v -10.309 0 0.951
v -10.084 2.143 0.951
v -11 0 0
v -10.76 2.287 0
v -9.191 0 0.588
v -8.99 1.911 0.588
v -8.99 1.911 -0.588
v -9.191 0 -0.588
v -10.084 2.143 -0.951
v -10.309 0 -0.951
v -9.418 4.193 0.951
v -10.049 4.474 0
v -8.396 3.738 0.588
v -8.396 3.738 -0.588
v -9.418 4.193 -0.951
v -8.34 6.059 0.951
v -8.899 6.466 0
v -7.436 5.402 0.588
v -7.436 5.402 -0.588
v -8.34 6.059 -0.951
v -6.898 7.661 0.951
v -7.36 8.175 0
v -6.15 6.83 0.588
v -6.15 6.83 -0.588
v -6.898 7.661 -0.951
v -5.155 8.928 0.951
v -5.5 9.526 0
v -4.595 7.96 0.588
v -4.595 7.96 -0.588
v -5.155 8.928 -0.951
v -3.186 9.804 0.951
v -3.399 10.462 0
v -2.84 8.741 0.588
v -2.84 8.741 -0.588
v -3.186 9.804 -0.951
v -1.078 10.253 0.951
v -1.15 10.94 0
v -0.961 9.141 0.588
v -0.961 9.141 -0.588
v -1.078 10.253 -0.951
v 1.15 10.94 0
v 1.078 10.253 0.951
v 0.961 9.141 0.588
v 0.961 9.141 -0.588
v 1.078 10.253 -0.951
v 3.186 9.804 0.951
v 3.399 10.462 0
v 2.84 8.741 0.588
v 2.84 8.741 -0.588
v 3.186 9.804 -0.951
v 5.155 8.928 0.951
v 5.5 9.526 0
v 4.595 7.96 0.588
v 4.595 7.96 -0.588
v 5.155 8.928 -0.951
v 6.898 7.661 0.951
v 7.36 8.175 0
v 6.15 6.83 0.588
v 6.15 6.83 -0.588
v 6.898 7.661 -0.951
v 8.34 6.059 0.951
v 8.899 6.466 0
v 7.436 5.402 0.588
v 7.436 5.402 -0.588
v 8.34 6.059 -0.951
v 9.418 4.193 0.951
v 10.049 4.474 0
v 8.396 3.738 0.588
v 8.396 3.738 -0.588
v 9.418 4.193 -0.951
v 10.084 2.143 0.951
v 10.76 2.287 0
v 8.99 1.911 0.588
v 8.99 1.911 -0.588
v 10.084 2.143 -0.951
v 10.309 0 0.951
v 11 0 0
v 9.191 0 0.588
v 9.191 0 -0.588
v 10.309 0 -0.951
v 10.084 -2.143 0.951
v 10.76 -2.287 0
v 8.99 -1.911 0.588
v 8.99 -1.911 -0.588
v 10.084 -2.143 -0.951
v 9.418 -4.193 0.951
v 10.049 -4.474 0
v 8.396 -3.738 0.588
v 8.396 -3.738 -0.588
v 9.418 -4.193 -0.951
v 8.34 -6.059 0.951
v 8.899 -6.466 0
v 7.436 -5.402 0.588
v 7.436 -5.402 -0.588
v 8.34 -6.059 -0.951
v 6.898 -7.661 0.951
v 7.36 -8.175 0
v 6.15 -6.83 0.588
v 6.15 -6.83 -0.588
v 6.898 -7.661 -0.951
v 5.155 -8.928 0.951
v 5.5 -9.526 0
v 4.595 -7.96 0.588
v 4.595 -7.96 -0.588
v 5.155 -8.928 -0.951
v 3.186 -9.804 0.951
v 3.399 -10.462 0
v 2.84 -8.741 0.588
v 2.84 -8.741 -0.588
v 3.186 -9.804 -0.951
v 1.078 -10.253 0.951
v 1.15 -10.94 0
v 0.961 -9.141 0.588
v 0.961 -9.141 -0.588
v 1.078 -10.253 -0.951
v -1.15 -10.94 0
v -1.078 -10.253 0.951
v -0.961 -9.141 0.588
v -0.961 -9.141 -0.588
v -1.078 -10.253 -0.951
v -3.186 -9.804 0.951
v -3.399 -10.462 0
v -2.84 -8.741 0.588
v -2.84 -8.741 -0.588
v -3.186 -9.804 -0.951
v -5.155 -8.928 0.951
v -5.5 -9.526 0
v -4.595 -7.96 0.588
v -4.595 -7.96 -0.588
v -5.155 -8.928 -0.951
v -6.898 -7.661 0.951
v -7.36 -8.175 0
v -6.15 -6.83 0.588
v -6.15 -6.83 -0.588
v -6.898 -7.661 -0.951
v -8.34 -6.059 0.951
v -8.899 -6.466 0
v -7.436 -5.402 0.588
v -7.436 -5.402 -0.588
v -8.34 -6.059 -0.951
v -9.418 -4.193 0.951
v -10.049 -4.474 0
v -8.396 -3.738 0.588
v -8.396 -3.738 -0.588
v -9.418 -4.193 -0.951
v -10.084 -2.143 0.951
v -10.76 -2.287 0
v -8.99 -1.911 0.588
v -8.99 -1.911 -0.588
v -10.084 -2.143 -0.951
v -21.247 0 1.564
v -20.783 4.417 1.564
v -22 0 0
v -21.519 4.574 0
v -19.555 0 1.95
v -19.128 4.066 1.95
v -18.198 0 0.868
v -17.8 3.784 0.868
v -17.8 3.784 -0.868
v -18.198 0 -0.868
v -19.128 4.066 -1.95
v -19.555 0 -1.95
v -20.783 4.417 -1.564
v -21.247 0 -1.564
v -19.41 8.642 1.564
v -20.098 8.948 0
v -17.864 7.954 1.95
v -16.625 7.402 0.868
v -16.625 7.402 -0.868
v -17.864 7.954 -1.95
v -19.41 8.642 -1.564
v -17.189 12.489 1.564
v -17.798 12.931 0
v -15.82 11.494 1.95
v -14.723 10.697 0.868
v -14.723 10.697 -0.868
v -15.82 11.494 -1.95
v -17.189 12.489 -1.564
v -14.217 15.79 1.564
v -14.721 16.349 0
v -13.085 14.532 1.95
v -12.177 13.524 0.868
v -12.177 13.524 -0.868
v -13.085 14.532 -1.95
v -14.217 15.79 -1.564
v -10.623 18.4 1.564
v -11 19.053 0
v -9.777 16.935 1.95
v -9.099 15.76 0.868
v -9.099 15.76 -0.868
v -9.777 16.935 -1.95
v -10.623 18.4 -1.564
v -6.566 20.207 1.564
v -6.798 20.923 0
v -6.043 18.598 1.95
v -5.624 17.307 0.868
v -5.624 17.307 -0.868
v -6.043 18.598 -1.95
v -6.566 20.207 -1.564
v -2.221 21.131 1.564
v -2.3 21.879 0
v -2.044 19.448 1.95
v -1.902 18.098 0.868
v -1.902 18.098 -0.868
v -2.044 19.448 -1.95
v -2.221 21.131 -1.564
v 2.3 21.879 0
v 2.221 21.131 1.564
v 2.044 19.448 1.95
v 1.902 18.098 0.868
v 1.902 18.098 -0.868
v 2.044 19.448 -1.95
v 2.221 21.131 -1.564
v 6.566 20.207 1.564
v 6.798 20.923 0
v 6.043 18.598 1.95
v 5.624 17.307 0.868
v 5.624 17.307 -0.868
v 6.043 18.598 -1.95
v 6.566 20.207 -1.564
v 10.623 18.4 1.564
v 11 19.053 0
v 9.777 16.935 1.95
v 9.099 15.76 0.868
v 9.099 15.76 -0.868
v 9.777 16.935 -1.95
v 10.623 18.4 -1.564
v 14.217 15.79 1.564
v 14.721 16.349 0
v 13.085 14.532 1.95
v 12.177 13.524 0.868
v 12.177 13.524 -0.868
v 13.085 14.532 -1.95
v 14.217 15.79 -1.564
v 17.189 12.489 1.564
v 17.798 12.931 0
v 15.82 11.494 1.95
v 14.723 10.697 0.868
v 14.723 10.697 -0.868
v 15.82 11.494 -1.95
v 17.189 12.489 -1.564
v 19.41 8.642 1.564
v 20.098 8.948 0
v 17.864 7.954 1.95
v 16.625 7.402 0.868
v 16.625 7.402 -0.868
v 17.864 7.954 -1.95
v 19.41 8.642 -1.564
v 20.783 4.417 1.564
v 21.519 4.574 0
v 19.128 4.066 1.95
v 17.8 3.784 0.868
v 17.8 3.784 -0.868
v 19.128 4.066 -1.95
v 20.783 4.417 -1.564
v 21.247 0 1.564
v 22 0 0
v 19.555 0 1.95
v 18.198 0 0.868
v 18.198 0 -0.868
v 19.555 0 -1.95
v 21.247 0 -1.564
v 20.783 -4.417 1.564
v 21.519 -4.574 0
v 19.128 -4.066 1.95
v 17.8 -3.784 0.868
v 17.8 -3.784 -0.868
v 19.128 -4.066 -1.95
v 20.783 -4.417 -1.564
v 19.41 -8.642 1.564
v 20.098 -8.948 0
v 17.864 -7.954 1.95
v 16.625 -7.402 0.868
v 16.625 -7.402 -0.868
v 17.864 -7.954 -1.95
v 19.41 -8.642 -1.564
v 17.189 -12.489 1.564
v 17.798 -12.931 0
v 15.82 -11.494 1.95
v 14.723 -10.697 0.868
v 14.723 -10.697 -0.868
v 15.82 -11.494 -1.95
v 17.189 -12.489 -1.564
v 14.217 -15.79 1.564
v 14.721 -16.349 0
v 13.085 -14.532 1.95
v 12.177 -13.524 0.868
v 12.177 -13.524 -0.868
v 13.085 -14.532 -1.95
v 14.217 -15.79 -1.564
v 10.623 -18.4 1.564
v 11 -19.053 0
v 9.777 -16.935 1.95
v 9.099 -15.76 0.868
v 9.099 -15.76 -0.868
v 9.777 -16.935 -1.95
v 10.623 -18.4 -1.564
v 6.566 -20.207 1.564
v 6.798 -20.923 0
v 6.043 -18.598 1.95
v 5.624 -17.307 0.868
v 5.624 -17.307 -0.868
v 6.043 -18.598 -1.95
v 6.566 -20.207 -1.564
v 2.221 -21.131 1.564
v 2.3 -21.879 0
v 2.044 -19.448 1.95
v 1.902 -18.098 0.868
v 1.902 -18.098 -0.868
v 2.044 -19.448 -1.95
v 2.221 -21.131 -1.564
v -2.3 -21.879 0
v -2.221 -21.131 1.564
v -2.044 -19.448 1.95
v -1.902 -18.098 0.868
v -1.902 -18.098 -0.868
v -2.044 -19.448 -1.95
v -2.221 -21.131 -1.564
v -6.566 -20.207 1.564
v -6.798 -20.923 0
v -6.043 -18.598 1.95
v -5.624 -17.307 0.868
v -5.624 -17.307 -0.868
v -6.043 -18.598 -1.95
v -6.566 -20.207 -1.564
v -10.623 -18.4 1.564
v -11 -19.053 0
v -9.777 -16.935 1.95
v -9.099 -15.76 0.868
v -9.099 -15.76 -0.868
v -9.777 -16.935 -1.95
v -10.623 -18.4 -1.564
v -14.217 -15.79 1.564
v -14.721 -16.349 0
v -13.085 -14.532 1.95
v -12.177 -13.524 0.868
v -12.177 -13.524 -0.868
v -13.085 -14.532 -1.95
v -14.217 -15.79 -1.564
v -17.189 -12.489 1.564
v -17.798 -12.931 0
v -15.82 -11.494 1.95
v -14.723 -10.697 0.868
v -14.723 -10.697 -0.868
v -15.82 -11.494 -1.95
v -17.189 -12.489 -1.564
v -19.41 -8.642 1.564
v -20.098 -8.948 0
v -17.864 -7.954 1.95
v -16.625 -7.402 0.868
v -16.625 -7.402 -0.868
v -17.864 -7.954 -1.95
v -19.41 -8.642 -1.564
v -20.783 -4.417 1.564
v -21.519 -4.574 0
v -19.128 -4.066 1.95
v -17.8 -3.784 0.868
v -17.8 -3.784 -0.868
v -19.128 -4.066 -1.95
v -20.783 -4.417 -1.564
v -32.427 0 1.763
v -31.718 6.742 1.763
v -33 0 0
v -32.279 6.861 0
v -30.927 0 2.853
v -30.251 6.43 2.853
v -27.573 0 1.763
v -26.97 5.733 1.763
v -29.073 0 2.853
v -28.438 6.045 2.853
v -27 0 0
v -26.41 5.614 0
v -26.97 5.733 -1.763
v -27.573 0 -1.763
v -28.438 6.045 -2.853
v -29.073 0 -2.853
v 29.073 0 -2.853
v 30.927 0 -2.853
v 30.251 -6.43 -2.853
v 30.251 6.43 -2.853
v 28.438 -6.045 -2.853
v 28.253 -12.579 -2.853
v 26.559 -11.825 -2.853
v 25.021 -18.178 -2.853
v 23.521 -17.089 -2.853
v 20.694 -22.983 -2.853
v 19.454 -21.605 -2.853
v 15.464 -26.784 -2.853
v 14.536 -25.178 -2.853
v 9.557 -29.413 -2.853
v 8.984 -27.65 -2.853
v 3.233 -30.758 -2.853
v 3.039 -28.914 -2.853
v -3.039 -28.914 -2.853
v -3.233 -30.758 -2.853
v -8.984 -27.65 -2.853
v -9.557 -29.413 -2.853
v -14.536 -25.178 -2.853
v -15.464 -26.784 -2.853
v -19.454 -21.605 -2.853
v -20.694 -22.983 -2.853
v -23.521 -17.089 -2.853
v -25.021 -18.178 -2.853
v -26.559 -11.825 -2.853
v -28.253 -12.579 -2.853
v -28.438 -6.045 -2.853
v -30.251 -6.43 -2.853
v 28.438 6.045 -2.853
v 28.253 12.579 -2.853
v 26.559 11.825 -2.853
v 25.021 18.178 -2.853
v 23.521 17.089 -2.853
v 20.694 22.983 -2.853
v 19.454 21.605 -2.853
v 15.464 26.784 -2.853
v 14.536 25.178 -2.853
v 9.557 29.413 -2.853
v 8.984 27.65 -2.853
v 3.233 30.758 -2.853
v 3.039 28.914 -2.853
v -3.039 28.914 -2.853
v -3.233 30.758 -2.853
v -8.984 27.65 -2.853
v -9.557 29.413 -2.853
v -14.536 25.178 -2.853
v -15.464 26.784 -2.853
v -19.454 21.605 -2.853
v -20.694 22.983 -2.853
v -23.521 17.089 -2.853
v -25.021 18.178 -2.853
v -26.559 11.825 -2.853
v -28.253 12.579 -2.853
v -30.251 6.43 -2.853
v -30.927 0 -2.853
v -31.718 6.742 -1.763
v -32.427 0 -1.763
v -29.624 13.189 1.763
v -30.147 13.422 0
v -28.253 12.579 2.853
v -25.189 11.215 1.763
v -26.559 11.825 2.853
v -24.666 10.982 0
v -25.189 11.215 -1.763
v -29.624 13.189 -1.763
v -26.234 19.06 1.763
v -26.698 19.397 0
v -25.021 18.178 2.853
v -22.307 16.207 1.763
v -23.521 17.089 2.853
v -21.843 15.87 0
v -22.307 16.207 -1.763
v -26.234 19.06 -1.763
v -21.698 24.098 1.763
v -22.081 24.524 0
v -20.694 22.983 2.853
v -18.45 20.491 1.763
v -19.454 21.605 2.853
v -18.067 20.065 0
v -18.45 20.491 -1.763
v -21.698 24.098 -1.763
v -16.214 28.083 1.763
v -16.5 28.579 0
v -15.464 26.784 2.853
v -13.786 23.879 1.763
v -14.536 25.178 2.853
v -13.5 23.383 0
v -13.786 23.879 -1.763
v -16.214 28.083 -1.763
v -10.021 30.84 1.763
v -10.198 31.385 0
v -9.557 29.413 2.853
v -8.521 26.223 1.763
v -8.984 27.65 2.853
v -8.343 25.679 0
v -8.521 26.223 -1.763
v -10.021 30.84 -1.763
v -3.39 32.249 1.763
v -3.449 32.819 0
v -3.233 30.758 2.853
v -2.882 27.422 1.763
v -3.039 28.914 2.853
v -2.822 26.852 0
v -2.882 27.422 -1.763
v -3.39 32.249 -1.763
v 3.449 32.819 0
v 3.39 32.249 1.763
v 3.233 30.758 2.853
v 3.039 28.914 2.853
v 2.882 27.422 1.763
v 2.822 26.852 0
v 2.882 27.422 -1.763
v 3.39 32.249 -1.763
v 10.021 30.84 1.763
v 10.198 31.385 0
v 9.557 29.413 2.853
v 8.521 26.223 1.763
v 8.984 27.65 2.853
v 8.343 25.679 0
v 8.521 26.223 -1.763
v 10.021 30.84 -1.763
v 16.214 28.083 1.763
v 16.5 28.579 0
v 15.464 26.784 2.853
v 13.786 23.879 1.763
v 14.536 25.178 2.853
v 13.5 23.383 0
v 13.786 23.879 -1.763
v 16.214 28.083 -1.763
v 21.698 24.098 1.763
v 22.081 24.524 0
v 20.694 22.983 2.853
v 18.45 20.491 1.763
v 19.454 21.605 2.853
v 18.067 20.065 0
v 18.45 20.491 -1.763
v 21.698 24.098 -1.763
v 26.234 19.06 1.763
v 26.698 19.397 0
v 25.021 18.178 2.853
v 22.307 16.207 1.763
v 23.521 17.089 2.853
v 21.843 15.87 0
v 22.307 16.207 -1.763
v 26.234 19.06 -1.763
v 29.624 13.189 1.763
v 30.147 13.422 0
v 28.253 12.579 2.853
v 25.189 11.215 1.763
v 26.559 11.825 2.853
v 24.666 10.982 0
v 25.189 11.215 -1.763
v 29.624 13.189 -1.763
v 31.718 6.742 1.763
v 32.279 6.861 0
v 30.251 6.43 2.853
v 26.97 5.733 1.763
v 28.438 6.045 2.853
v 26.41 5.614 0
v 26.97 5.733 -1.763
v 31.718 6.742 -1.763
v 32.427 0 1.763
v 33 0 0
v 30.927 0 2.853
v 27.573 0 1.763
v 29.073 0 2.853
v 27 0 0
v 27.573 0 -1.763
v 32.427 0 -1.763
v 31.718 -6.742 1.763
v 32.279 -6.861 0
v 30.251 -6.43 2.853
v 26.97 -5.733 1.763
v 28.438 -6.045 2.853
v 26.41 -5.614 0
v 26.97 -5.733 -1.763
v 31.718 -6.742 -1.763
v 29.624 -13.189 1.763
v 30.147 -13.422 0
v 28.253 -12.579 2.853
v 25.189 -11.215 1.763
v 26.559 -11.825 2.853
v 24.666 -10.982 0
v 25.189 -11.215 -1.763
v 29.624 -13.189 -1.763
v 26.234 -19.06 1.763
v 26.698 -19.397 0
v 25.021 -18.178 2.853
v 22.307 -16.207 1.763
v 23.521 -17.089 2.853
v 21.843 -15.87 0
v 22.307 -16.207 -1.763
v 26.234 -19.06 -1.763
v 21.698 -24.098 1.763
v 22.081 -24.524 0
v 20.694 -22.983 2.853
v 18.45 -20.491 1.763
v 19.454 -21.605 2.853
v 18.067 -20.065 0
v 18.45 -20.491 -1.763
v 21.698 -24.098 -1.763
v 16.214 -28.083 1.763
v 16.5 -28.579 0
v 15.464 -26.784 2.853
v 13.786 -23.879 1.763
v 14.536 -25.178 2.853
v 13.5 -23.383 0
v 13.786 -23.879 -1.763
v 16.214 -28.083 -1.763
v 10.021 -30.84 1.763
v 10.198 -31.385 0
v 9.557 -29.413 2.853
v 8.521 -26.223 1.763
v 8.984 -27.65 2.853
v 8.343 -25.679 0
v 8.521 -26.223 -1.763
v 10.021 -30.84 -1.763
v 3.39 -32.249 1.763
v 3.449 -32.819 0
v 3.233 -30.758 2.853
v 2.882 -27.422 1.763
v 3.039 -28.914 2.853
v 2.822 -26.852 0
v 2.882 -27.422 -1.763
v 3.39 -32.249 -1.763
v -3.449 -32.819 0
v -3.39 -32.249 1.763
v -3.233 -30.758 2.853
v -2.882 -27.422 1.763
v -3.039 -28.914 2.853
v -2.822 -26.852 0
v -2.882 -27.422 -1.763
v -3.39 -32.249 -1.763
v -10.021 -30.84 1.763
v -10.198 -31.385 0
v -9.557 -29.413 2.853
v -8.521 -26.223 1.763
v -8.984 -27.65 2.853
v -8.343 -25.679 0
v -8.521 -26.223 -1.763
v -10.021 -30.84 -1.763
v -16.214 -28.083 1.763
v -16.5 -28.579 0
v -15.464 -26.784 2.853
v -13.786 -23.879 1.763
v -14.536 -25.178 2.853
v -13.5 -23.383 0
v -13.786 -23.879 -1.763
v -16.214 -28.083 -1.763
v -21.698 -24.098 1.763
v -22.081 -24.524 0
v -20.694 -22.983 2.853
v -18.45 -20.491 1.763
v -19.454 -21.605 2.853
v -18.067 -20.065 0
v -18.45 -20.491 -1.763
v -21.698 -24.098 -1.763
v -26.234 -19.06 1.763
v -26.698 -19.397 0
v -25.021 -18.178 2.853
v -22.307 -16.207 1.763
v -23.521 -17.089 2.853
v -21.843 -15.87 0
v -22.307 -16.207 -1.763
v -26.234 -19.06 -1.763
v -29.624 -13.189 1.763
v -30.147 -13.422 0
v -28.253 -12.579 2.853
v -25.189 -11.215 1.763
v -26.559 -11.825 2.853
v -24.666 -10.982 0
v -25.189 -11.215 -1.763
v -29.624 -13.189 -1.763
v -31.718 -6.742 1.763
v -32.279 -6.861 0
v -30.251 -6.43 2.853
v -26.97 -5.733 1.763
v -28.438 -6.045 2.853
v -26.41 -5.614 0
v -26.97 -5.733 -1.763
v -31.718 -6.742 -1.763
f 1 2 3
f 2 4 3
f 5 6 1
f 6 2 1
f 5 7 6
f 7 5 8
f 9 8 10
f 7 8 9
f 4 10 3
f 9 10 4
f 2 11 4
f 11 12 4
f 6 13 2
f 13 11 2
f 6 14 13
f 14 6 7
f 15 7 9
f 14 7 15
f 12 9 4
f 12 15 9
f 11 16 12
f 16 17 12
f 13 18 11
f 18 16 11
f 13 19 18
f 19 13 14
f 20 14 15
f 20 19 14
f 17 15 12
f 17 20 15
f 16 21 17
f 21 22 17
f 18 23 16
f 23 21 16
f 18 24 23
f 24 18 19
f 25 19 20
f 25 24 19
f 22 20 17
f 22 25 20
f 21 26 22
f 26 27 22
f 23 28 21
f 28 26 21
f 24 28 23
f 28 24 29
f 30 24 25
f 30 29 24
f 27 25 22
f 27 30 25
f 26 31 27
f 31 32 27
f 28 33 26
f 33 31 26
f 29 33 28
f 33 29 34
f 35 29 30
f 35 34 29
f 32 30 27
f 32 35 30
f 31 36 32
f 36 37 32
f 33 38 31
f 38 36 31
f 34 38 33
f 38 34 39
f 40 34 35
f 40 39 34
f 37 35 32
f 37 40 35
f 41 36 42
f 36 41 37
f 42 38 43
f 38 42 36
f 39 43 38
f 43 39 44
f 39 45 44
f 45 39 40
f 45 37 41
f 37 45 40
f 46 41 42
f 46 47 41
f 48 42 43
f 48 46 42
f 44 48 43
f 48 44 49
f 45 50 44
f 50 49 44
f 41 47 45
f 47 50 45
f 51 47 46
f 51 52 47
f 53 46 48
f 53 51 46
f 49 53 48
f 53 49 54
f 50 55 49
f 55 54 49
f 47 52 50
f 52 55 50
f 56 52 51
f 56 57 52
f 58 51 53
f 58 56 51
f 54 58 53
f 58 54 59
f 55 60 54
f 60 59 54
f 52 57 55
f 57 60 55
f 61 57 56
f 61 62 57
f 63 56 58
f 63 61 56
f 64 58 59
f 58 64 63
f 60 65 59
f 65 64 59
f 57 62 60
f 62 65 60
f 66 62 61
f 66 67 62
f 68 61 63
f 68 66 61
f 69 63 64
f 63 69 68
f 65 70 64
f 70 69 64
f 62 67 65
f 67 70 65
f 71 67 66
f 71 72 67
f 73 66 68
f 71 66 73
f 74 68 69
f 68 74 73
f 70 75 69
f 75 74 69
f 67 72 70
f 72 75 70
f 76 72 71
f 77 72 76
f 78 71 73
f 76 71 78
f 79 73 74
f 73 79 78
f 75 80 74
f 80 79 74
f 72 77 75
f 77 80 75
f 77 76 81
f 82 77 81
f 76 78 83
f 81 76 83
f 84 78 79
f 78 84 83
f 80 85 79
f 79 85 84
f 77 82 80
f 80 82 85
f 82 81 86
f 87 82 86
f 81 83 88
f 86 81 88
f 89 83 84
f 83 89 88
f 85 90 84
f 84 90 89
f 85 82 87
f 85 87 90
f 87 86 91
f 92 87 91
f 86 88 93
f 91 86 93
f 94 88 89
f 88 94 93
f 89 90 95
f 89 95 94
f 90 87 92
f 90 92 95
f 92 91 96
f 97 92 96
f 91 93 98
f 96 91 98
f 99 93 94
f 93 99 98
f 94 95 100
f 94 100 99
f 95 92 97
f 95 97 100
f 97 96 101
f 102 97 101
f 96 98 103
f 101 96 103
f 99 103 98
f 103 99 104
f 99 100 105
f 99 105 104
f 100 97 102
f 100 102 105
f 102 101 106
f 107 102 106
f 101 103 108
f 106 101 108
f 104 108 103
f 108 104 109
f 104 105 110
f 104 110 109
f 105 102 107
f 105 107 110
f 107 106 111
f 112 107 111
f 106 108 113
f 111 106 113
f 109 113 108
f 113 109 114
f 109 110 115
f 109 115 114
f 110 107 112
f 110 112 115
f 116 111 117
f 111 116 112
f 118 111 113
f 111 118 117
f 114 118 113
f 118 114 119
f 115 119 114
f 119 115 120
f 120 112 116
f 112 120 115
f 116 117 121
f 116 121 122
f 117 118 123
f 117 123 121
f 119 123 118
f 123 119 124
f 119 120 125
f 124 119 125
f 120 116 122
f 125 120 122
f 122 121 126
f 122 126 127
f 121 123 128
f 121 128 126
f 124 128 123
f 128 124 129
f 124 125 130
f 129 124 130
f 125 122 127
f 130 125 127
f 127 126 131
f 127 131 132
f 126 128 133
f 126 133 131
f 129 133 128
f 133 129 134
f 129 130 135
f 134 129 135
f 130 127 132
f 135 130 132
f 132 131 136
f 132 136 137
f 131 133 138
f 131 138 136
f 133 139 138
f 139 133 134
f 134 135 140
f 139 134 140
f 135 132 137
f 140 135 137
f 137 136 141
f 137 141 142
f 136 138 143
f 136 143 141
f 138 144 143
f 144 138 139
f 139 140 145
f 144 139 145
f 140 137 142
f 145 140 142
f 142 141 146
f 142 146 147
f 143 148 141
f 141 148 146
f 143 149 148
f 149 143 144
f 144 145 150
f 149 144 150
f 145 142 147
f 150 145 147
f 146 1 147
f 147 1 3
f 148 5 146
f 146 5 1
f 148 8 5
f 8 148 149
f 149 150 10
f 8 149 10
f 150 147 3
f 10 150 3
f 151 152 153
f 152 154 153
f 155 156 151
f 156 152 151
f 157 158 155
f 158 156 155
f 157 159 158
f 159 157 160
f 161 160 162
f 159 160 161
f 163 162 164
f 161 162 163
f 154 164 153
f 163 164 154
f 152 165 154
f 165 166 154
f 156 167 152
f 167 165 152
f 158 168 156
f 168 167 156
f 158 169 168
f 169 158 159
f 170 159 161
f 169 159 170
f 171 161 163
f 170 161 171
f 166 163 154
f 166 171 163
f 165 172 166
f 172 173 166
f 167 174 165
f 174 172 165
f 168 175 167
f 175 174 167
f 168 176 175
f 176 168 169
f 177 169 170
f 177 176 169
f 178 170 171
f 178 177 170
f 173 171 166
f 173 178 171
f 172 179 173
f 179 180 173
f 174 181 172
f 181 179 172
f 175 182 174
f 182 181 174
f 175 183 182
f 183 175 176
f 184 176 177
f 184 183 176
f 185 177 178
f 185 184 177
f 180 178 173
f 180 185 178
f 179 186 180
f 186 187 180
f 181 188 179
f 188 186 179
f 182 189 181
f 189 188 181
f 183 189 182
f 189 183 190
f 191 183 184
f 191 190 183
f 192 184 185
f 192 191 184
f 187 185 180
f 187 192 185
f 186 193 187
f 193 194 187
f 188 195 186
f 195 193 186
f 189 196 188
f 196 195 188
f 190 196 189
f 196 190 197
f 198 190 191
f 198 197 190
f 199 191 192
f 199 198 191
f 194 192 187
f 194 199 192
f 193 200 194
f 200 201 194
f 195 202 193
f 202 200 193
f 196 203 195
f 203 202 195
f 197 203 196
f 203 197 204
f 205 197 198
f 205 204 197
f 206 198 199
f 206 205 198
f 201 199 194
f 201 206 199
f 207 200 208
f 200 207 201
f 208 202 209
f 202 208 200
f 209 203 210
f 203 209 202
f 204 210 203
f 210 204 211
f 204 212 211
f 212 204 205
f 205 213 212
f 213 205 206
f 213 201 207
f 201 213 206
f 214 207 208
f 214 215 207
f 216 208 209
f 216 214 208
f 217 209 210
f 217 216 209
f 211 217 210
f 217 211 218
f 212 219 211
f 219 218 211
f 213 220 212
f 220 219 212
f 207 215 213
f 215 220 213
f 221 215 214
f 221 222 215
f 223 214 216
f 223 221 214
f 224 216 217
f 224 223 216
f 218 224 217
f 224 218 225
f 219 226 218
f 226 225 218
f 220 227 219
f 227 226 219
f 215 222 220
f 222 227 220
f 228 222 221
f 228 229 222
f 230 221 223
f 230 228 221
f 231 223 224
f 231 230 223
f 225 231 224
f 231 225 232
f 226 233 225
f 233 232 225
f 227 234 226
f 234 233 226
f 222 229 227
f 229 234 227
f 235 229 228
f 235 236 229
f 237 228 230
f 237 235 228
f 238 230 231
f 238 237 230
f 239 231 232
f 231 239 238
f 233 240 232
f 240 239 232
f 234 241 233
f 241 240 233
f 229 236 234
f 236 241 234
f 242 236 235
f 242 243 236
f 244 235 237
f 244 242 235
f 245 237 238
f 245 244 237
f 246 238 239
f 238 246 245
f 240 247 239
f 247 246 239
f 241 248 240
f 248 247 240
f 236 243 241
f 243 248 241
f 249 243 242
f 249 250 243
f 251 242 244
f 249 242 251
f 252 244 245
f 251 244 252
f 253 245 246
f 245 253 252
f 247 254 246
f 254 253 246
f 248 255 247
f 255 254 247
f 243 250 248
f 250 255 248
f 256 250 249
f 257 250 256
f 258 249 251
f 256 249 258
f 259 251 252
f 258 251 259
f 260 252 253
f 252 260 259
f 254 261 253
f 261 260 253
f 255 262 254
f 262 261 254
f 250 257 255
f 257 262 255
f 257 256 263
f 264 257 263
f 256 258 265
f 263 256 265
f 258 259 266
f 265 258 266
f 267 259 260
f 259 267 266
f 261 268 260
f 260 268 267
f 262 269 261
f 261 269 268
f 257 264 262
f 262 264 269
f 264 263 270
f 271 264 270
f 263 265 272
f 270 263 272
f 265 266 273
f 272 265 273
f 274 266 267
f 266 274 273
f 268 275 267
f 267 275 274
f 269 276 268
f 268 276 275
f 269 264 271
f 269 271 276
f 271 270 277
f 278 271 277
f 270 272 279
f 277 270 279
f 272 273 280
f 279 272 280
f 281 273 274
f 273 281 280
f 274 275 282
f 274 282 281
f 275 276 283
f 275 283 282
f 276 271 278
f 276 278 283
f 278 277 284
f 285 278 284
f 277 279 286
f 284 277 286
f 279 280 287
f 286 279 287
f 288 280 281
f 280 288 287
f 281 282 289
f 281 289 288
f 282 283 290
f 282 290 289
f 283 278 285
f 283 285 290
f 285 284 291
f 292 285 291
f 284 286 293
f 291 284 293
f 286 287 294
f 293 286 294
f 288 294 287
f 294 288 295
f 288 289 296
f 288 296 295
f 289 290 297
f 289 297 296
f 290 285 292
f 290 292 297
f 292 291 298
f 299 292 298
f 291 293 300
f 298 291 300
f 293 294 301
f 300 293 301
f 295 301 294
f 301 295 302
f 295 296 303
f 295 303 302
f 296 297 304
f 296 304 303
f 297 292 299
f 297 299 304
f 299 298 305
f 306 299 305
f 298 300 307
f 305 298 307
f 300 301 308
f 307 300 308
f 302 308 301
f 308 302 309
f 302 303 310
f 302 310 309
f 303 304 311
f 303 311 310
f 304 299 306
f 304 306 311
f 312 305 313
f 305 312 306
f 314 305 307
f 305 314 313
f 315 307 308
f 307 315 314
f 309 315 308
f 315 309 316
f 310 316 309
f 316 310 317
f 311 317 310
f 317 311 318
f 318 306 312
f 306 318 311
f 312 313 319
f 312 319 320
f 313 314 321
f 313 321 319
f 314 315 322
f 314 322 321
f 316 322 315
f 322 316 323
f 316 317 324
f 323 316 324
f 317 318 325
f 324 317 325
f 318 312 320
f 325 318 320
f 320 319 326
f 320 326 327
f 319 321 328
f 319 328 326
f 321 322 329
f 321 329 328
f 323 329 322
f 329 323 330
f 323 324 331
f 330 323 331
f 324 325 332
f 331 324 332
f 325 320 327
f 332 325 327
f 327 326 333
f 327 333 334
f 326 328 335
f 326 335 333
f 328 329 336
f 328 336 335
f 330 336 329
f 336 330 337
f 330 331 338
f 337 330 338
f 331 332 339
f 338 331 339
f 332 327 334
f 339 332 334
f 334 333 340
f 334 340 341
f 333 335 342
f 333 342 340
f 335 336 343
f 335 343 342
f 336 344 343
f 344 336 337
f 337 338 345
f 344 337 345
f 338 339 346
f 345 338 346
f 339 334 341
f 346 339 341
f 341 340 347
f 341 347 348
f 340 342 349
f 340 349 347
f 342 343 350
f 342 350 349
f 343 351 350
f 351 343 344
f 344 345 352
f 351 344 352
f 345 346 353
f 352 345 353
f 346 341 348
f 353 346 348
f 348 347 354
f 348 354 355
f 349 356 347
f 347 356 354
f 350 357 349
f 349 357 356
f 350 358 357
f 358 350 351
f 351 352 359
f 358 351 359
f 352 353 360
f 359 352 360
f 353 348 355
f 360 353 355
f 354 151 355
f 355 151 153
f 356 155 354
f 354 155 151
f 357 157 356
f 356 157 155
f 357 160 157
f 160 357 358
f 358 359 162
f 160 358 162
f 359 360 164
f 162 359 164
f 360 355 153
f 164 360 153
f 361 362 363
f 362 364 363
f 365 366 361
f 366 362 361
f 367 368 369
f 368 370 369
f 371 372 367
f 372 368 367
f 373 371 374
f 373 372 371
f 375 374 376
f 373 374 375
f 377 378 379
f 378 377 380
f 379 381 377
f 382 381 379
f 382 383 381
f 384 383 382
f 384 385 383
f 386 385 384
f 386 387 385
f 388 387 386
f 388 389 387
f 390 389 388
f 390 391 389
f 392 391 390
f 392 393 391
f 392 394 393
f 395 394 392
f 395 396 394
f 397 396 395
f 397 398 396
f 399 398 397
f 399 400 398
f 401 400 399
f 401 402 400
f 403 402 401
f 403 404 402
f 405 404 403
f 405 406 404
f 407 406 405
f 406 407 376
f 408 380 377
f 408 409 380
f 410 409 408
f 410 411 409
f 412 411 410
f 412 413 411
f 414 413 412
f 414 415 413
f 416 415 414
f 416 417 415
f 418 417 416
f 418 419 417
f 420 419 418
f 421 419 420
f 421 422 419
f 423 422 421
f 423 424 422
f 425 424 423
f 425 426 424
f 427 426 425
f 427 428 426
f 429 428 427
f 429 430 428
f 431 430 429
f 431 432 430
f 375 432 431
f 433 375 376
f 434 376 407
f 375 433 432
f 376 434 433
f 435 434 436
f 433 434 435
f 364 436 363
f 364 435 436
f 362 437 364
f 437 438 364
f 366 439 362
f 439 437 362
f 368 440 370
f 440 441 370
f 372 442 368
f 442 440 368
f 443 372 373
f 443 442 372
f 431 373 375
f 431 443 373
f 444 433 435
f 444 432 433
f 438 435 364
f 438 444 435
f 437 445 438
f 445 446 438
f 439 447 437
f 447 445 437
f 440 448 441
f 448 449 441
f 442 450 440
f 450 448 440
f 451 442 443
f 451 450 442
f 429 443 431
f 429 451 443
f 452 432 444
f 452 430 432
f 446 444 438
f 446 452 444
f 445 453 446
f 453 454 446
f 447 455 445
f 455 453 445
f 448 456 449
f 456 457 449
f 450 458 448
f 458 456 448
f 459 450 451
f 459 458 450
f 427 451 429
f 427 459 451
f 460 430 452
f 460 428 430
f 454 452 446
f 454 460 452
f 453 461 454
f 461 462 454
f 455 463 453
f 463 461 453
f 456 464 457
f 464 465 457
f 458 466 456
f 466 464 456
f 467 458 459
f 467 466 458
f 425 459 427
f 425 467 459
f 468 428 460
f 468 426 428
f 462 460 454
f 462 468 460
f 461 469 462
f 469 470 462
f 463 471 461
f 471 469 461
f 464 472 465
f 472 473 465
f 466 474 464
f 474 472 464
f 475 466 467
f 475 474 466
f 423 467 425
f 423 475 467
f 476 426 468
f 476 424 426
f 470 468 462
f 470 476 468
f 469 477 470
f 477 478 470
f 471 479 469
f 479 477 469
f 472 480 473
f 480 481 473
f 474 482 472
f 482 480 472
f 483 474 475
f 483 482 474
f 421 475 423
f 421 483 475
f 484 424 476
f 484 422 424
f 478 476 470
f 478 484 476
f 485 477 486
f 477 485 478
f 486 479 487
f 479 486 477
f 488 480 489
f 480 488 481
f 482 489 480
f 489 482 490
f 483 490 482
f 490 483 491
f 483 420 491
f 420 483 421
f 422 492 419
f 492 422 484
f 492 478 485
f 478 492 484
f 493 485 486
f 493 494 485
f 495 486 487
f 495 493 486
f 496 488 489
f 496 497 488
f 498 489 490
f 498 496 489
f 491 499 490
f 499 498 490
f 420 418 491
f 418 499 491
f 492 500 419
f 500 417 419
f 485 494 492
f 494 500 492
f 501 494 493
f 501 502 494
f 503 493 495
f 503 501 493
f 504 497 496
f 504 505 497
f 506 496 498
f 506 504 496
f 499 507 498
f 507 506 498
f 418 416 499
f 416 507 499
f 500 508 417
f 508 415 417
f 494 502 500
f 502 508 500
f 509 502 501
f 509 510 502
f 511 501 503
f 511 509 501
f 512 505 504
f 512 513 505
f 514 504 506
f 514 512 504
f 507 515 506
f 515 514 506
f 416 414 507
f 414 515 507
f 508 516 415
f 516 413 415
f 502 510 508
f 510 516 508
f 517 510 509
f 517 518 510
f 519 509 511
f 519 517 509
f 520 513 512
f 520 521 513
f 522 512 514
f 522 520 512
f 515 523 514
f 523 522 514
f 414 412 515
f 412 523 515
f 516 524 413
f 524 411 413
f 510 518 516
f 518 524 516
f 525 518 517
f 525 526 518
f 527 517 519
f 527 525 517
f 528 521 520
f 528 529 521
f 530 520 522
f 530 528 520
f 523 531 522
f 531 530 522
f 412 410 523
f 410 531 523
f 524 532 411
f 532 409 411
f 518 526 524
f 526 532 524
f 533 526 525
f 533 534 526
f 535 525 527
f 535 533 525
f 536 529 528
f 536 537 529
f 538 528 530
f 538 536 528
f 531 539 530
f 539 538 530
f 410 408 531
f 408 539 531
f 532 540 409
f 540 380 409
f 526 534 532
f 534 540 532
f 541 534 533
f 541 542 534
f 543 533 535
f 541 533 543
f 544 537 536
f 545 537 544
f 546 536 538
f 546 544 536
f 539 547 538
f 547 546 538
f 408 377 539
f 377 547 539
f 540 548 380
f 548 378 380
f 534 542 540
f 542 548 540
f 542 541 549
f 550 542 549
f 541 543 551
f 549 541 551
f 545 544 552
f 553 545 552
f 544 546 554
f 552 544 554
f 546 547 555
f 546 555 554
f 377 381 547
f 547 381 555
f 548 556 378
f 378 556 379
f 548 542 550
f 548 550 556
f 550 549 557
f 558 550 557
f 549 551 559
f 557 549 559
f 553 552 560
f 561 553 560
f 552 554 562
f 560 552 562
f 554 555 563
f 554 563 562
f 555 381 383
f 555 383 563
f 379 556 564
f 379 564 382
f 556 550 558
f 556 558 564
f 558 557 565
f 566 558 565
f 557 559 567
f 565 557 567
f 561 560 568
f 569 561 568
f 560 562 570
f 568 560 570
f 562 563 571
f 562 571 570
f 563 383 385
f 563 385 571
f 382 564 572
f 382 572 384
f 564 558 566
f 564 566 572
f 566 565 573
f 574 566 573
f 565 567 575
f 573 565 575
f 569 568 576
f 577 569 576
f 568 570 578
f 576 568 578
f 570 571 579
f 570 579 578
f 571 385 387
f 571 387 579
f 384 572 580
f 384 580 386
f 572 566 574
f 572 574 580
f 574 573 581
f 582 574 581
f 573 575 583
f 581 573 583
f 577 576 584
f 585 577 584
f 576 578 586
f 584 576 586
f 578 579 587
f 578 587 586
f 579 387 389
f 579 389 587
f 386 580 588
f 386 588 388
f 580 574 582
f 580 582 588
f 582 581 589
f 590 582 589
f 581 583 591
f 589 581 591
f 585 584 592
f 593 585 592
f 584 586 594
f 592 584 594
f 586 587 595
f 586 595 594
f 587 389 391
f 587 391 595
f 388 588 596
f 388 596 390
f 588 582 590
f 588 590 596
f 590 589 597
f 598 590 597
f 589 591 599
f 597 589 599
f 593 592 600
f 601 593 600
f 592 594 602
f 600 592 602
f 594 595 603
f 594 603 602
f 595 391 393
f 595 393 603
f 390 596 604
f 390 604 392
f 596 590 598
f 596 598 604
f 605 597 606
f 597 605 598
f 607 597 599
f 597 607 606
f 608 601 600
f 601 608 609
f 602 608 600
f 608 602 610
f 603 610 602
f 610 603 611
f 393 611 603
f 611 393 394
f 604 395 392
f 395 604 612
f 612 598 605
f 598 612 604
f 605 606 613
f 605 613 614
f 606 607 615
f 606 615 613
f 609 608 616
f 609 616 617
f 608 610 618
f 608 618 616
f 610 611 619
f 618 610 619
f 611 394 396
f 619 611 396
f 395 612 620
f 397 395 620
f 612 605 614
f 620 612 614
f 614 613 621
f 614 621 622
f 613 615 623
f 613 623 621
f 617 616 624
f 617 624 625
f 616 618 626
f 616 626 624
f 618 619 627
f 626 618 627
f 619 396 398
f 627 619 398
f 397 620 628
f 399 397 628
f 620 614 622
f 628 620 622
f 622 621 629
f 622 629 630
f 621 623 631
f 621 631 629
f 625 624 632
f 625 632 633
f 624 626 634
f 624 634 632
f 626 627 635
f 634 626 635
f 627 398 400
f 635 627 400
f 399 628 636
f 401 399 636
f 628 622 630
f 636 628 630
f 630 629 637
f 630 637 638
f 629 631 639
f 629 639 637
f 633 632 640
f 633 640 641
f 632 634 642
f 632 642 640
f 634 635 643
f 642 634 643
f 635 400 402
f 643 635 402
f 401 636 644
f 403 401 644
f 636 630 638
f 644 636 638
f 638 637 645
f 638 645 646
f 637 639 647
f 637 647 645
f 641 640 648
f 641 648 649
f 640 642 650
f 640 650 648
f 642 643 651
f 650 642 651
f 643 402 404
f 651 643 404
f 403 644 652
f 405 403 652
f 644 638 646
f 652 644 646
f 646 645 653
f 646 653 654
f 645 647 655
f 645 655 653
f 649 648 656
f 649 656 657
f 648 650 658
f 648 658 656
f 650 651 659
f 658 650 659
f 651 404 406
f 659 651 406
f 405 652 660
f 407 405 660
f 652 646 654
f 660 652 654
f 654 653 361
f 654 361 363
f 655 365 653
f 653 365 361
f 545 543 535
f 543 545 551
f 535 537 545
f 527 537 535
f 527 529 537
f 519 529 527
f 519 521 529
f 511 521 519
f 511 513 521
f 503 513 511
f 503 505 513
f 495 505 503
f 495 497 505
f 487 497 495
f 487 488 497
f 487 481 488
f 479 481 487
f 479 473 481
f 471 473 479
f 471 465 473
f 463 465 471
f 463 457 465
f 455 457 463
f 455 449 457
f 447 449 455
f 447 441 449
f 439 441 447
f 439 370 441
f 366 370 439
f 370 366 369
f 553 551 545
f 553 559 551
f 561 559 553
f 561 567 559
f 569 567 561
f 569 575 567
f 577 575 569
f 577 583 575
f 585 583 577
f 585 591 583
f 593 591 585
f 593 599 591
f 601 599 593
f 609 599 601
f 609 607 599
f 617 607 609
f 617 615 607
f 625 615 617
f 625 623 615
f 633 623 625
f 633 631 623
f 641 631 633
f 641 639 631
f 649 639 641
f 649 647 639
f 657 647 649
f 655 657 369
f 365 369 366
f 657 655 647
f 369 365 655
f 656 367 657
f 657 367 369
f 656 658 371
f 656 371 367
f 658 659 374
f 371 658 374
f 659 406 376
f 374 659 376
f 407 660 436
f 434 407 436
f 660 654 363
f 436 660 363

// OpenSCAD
/*
* Ring (v1). 
*
* 1/5/2020
* dan.bush@techentourage.com
*/
//$fn=30;

module ring(offset_from_center, radius) {
  rotate_extrude(angle = 360, convexity = 10) {
    translate([offset_from_center, 0, 0]) {
      circle(radius);
    }
  }
}

ring(10,1);
ring(20,2);
ring(30,3);
